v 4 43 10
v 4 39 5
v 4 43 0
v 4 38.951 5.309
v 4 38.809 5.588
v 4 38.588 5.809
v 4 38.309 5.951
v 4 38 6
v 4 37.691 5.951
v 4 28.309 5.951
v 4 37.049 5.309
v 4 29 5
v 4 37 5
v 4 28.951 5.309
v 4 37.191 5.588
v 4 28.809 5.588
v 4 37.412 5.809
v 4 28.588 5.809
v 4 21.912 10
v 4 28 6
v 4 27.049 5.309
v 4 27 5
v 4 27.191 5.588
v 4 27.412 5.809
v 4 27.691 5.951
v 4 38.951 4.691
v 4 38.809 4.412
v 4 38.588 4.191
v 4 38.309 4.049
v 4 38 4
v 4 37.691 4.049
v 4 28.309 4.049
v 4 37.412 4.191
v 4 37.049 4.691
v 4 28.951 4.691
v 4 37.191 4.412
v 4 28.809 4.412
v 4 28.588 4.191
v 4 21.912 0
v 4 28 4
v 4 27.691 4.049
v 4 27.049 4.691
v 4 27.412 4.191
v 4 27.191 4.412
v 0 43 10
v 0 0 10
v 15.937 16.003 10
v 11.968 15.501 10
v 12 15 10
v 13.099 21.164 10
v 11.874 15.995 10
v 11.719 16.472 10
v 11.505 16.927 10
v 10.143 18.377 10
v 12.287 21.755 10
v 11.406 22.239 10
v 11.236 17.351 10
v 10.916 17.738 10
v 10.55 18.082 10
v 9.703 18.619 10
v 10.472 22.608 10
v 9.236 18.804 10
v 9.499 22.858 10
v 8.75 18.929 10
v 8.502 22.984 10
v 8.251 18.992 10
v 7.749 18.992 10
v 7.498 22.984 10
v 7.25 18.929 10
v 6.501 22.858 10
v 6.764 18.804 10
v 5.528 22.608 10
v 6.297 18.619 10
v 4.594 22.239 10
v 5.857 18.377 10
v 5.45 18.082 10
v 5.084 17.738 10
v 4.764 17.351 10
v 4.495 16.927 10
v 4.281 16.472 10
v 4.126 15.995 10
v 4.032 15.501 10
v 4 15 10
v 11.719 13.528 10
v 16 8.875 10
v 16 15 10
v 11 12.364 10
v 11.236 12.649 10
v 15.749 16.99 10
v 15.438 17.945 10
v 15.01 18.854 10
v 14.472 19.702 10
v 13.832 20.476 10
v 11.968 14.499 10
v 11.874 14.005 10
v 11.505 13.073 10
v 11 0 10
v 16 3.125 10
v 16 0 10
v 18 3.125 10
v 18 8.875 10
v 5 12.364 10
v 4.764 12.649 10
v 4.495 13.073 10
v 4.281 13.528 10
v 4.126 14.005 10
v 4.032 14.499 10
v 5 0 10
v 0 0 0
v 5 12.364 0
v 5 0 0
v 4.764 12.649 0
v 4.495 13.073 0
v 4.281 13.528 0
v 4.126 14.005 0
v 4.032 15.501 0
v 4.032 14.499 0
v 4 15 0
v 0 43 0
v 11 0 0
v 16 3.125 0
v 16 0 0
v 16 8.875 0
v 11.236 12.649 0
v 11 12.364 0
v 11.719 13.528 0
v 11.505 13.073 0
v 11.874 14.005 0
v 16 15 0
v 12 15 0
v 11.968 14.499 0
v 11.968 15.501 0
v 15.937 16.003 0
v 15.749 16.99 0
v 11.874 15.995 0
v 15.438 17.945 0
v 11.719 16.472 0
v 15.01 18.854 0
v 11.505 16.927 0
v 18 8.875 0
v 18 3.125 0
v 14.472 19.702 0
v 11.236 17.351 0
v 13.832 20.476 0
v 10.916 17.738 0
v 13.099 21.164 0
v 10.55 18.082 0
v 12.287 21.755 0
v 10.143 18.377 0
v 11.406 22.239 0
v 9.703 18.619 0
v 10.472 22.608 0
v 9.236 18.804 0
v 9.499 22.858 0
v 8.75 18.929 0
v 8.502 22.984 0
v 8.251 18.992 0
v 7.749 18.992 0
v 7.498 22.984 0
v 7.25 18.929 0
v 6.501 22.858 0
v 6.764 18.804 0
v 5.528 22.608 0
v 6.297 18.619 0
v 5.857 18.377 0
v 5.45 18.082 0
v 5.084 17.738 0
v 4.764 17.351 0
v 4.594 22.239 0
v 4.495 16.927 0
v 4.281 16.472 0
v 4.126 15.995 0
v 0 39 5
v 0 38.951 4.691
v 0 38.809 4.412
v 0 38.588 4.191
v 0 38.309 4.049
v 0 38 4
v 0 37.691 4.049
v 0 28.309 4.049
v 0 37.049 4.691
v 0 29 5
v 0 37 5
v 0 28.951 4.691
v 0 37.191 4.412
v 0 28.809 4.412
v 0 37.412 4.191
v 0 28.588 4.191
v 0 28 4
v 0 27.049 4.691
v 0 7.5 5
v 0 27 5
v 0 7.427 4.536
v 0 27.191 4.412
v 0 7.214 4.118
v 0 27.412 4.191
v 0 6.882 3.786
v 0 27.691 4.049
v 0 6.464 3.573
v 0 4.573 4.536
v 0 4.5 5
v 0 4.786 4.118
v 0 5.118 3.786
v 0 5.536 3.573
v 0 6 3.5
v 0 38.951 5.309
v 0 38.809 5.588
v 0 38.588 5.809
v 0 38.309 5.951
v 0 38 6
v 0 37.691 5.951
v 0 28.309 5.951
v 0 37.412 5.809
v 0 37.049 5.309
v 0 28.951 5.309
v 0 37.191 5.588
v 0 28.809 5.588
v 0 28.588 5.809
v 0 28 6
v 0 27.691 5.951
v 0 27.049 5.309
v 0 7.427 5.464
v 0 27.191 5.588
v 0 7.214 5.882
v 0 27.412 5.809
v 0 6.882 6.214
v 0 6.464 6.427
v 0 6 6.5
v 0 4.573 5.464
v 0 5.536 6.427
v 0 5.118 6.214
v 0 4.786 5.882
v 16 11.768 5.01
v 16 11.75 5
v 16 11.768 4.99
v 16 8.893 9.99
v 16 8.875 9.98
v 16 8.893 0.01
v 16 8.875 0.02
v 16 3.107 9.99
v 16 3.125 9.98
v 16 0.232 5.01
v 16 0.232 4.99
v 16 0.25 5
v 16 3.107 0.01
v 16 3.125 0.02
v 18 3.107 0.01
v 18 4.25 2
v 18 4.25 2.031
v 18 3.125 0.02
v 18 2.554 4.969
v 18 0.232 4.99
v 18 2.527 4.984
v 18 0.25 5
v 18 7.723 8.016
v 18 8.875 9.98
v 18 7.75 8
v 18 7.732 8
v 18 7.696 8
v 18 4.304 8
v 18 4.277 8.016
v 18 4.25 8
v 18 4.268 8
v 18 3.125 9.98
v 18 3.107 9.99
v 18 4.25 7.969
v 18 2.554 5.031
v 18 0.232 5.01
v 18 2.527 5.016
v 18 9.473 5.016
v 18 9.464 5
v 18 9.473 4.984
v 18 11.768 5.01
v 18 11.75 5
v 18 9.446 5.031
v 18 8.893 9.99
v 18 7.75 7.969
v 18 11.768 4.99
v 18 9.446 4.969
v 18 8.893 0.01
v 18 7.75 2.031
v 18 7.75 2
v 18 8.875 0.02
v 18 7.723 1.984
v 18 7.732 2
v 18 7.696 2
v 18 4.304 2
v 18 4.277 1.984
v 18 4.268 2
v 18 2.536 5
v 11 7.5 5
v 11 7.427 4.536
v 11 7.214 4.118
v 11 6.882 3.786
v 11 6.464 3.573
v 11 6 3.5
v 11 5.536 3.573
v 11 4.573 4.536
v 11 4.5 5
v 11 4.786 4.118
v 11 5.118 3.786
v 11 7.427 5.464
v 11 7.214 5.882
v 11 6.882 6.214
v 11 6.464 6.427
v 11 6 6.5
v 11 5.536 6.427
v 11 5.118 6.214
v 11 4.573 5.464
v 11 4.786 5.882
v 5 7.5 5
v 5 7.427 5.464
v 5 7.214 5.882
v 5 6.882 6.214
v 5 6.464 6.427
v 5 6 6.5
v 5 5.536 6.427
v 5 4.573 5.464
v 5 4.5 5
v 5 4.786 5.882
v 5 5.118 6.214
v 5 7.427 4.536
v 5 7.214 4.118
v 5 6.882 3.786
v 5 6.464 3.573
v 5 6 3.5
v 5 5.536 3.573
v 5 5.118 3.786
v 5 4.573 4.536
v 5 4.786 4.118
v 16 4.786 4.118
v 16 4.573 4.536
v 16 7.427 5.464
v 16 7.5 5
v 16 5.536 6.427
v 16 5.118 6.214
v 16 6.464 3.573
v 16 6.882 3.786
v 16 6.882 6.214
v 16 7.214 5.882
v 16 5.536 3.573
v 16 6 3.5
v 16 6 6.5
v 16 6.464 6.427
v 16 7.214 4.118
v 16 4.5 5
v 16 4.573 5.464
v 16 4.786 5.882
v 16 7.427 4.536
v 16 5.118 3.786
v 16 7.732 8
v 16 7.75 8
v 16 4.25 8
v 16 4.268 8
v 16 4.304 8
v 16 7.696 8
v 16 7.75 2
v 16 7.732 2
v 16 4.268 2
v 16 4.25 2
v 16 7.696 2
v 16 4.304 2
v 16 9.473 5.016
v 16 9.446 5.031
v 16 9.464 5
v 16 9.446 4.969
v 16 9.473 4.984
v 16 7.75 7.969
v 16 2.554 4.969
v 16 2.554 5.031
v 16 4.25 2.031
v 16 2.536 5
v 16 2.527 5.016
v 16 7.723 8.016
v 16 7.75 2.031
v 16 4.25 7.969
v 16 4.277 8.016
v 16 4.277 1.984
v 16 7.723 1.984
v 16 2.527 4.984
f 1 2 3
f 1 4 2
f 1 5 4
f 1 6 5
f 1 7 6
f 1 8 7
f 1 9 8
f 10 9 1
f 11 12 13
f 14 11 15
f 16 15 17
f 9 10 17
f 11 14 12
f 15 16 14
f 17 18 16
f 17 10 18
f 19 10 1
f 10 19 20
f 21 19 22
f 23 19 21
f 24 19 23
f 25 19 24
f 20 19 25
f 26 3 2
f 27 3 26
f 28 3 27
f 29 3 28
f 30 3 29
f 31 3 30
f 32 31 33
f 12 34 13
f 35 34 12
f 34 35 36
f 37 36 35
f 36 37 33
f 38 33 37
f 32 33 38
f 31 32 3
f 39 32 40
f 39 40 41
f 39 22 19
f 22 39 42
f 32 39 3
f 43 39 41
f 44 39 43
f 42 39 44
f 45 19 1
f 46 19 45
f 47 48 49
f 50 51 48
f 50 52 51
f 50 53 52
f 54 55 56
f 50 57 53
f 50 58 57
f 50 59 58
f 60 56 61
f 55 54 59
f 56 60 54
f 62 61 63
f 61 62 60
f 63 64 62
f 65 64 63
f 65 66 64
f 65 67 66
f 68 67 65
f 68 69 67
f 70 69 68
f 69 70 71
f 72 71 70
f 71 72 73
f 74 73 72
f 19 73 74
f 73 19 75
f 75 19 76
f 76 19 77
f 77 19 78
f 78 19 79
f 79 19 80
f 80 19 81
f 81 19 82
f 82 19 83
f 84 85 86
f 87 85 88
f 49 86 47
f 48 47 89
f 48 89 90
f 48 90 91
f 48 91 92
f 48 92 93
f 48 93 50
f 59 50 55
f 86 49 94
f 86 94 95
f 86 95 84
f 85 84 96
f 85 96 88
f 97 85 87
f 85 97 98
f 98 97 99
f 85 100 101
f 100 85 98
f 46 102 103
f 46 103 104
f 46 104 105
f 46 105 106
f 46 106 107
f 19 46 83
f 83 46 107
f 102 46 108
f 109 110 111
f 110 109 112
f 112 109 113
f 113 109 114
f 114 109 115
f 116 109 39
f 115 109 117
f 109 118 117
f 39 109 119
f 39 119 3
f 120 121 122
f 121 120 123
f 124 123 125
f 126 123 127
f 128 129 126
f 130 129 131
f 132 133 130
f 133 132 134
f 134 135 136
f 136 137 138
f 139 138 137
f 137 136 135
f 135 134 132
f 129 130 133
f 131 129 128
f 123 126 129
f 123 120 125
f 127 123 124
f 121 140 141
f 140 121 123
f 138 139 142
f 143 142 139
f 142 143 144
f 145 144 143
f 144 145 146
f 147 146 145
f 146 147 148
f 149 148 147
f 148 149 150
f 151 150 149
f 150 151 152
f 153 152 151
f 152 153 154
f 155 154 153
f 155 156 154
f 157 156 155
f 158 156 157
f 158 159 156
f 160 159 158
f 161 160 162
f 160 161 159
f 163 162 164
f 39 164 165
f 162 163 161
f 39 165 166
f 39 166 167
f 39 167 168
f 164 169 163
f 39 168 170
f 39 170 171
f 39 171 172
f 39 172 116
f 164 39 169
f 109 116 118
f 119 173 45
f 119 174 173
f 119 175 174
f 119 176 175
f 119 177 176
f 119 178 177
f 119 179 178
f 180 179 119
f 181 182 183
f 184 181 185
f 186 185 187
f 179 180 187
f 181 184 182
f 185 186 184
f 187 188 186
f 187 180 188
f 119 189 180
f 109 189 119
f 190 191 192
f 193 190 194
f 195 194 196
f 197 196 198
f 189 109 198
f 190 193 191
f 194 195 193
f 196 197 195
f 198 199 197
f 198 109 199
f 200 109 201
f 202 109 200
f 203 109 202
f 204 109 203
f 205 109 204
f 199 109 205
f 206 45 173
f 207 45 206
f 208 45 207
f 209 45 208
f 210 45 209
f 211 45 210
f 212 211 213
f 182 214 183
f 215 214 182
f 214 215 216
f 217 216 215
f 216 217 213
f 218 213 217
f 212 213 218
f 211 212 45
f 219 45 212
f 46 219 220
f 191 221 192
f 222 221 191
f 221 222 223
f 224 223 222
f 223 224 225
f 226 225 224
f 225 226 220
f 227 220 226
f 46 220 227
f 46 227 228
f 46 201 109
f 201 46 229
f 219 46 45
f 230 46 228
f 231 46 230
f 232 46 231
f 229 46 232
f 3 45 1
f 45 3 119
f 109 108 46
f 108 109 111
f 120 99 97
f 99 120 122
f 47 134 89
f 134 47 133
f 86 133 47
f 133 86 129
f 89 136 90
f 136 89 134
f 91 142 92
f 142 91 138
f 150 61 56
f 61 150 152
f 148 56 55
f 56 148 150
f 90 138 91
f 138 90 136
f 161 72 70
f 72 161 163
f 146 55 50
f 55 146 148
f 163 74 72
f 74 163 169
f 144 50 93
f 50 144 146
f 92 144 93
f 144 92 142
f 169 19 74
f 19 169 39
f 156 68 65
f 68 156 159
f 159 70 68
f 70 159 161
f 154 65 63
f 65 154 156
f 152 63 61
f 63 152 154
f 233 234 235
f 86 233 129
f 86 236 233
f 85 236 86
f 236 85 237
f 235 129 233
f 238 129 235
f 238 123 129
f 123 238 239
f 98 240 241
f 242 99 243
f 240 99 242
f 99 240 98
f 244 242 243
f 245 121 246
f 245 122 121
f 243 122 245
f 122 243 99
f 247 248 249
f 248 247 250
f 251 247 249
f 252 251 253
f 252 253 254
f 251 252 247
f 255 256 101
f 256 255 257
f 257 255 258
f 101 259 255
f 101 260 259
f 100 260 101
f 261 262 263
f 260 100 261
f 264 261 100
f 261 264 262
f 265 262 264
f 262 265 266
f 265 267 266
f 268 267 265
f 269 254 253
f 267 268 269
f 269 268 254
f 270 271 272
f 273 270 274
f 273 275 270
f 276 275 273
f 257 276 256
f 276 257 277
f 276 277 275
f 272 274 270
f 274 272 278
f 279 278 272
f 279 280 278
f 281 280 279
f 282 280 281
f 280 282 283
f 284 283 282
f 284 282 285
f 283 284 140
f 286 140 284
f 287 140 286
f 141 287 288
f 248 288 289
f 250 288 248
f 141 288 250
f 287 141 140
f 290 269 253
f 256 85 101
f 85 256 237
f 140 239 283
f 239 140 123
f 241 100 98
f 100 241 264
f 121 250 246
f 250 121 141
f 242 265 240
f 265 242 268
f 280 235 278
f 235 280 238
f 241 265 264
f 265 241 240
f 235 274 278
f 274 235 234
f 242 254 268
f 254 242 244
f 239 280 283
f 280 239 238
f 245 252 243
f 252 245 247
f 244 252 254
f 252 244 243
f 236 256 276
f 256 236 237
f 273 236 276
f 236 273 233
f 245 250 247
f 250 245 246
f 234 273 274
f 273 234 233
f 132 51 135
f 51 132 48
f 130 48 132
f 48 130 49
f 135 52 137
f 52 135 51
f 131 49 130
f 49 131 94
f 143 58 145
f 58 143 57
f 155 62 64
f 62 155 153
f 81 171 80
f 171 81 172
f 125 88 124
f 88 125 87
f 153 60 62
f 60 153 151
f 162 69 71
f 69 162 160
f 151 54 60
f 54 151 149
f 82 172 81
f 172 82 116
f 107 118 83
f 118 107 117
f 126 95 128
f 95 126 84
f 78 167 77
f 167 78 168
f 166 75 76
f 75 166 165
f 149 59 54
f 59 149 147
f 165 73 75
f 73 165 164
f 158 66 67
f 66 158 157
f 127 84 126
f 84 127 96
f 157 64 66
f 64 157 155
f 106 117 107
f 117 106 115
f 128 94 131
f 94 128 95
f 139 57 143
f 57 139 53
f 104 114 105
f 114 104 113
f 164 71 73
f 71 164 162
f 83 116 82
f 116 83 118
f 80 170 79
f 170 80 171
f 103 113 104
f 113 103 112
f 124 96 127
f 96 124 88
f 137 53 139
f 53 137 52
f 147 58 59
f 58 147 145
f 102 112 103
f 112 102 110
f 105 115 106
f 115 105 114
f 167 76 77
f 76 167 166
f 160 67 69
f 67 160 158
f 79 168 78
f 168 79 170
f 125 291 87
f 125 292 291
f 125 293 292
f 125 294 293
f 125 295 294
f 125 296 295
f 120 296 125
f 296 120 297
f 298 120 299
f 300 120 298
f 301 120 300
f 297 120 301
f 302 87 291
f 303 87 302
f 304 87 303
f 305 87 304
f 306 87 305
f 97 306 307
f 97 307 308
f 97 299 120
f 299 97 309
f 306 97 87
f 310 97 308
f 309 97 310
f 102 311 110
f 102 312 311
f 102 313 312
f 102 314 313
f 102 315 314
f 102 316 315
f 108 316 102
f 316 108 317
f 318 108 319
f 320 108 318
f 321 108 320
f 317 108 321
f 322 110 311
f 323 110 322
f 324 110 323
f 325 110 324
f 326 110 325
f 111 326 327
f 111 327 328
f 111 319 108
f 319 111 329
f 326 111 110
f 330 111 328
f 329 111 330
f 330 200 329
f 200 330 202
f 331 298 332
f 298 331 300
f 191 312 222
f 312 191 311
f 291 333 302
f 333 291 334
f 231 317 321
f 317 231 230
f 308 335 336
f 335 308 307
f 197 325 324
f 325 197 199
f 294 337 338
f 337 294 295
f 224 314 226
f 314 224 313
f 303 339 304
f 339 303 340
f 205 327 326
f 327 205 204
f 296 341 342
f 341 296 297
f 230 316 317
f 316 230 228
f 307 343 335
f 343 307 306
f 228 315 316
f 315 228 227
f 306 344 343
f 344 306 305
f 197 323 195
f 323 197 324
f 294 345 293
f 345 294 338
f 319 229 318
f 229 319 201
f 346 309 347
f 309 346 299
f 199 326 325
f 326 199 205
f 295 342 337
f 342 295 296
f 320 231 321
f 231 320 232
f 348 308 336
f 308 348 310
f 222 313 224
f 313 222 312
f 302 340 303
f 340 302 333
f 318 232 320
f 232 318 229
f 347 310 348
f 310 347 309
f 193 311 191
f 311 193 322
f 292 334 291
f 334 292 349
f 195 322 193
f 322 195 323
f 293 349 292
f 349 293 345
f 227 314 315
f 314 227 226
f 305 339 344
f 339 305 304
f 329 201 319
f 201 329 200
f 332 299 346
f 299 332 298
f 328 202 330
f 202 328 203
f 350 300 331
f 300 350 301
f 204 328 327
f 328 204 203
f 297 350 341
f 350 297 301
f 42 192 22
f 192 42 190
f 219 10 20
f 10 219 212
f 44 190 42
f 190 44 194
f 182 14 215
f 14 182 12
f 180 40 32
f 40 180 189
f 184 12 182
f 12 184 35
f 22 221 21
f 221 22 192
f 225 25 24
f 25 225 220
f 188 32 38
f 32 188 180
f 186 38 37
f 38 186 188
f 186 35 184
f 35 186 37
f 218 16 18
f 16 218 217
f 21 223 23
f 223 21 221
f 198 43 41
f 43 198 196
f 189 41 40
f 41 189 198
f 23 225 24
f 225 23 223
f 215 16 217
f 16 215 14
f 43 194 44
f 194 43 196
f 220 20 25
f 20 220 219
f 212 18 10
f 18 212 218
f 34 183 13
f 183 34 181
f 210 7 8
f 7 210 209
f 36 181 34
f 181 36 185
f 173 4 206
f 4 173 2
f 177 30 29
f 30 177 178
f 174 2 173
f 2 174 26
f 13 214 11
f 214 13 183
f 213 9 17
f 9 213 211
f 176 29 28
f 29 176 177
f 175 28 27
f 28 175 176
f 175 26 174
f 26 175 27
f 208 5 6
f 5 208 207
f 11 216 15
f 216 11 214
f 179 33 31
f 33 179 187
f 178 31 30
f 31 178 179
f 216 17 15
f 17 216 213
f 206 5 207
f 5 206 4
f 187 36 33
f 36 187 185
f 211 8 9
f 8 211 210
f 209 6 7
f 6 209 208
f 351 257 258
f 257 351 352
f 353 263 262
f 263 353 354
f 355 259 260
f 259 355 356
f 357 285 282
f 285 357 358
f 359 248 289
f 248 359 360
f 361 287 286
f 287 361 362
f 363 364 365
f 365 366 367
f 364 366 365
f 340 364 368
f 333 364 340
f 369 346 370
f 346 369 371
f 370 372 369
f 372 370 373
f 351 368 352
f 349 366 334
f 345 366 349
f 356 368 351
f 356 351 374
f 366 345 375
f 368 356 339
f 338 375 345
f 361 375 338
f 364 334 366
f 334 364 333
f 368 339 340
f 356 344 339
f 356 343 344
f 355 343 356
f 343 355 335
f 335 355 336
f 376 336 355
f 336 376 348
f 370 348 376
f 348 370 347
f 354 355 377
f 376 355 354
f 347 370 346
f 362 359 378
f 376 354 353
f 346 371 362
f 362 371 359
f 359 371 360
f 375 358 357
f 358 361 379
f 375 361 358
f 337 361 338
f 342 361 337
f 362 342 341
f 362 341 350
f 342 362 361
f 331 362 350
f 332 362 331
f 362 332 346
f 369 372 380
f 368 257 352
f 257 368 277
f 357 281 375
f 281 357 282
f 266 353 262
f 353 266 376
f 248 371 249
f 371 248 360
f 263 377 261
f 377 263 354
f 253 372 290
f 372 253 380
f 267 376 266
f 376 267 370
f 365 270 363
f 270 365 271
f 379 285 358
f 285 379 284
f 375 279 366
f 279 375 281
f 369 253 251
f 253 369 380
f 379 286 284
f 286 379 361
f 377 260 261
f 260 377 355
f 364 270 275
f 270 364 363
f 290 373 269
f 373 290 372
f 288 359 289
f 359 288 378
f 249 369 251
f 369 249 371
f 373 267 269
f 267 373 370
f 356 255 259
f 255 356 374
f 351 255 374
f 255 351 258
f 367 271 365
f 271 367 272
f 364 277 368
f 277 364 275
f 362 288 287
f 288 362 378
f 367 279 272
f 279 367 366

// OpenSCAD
// taken from http://www.thingiverse.com/thing:30085/#files
difference() {
	union() {
		cube([4,43,10]);  //4,45,10
		translate([8, 15,0]) cylinder(h = 10, r = 8, $fn = 50);
		cube([16, 15,10]);
		
		translate([17,6,5]) cube([2,5.75,10], center=true);
		translate([17,6,5]) rotate(a=[60,0,0]) cube([2,5.75,10], center=true);
		translate([17,6,5]) rotate(a=[120,0,0]) cube([2,5.75,10], center=true);
	}
	translate([8, 15,0]) cylinder(h = 10, r = 4, $fn = 50);
	translate([5, 0, 0]) cube([6, 15,10]);
	translate([-10, 6, 5]) rotate(a=[0, 90, 0]) cylinder(h = 30, r = 1.5, $fn= 20);
	translate([-10, 28, 5]) rotate(a=[0, 90, 0]) cylinder(h = 30, r = 1, $fn= 20);
	translate([-10, 38, 5]) rotate(a=[0, 90, 0]) cylinder(h = 30, r = 1, $fn= 20);
	translate([17,6,5]) cube([2,3.5,6], center=true);
	translate([17,6,5]) rotate(a=[60,0,0]) cube([2,3.5,6], center=true);
	translate([17,6,5]) rotate(a=[120,0,0]) cube([2,3.5,6], center=true);
}
